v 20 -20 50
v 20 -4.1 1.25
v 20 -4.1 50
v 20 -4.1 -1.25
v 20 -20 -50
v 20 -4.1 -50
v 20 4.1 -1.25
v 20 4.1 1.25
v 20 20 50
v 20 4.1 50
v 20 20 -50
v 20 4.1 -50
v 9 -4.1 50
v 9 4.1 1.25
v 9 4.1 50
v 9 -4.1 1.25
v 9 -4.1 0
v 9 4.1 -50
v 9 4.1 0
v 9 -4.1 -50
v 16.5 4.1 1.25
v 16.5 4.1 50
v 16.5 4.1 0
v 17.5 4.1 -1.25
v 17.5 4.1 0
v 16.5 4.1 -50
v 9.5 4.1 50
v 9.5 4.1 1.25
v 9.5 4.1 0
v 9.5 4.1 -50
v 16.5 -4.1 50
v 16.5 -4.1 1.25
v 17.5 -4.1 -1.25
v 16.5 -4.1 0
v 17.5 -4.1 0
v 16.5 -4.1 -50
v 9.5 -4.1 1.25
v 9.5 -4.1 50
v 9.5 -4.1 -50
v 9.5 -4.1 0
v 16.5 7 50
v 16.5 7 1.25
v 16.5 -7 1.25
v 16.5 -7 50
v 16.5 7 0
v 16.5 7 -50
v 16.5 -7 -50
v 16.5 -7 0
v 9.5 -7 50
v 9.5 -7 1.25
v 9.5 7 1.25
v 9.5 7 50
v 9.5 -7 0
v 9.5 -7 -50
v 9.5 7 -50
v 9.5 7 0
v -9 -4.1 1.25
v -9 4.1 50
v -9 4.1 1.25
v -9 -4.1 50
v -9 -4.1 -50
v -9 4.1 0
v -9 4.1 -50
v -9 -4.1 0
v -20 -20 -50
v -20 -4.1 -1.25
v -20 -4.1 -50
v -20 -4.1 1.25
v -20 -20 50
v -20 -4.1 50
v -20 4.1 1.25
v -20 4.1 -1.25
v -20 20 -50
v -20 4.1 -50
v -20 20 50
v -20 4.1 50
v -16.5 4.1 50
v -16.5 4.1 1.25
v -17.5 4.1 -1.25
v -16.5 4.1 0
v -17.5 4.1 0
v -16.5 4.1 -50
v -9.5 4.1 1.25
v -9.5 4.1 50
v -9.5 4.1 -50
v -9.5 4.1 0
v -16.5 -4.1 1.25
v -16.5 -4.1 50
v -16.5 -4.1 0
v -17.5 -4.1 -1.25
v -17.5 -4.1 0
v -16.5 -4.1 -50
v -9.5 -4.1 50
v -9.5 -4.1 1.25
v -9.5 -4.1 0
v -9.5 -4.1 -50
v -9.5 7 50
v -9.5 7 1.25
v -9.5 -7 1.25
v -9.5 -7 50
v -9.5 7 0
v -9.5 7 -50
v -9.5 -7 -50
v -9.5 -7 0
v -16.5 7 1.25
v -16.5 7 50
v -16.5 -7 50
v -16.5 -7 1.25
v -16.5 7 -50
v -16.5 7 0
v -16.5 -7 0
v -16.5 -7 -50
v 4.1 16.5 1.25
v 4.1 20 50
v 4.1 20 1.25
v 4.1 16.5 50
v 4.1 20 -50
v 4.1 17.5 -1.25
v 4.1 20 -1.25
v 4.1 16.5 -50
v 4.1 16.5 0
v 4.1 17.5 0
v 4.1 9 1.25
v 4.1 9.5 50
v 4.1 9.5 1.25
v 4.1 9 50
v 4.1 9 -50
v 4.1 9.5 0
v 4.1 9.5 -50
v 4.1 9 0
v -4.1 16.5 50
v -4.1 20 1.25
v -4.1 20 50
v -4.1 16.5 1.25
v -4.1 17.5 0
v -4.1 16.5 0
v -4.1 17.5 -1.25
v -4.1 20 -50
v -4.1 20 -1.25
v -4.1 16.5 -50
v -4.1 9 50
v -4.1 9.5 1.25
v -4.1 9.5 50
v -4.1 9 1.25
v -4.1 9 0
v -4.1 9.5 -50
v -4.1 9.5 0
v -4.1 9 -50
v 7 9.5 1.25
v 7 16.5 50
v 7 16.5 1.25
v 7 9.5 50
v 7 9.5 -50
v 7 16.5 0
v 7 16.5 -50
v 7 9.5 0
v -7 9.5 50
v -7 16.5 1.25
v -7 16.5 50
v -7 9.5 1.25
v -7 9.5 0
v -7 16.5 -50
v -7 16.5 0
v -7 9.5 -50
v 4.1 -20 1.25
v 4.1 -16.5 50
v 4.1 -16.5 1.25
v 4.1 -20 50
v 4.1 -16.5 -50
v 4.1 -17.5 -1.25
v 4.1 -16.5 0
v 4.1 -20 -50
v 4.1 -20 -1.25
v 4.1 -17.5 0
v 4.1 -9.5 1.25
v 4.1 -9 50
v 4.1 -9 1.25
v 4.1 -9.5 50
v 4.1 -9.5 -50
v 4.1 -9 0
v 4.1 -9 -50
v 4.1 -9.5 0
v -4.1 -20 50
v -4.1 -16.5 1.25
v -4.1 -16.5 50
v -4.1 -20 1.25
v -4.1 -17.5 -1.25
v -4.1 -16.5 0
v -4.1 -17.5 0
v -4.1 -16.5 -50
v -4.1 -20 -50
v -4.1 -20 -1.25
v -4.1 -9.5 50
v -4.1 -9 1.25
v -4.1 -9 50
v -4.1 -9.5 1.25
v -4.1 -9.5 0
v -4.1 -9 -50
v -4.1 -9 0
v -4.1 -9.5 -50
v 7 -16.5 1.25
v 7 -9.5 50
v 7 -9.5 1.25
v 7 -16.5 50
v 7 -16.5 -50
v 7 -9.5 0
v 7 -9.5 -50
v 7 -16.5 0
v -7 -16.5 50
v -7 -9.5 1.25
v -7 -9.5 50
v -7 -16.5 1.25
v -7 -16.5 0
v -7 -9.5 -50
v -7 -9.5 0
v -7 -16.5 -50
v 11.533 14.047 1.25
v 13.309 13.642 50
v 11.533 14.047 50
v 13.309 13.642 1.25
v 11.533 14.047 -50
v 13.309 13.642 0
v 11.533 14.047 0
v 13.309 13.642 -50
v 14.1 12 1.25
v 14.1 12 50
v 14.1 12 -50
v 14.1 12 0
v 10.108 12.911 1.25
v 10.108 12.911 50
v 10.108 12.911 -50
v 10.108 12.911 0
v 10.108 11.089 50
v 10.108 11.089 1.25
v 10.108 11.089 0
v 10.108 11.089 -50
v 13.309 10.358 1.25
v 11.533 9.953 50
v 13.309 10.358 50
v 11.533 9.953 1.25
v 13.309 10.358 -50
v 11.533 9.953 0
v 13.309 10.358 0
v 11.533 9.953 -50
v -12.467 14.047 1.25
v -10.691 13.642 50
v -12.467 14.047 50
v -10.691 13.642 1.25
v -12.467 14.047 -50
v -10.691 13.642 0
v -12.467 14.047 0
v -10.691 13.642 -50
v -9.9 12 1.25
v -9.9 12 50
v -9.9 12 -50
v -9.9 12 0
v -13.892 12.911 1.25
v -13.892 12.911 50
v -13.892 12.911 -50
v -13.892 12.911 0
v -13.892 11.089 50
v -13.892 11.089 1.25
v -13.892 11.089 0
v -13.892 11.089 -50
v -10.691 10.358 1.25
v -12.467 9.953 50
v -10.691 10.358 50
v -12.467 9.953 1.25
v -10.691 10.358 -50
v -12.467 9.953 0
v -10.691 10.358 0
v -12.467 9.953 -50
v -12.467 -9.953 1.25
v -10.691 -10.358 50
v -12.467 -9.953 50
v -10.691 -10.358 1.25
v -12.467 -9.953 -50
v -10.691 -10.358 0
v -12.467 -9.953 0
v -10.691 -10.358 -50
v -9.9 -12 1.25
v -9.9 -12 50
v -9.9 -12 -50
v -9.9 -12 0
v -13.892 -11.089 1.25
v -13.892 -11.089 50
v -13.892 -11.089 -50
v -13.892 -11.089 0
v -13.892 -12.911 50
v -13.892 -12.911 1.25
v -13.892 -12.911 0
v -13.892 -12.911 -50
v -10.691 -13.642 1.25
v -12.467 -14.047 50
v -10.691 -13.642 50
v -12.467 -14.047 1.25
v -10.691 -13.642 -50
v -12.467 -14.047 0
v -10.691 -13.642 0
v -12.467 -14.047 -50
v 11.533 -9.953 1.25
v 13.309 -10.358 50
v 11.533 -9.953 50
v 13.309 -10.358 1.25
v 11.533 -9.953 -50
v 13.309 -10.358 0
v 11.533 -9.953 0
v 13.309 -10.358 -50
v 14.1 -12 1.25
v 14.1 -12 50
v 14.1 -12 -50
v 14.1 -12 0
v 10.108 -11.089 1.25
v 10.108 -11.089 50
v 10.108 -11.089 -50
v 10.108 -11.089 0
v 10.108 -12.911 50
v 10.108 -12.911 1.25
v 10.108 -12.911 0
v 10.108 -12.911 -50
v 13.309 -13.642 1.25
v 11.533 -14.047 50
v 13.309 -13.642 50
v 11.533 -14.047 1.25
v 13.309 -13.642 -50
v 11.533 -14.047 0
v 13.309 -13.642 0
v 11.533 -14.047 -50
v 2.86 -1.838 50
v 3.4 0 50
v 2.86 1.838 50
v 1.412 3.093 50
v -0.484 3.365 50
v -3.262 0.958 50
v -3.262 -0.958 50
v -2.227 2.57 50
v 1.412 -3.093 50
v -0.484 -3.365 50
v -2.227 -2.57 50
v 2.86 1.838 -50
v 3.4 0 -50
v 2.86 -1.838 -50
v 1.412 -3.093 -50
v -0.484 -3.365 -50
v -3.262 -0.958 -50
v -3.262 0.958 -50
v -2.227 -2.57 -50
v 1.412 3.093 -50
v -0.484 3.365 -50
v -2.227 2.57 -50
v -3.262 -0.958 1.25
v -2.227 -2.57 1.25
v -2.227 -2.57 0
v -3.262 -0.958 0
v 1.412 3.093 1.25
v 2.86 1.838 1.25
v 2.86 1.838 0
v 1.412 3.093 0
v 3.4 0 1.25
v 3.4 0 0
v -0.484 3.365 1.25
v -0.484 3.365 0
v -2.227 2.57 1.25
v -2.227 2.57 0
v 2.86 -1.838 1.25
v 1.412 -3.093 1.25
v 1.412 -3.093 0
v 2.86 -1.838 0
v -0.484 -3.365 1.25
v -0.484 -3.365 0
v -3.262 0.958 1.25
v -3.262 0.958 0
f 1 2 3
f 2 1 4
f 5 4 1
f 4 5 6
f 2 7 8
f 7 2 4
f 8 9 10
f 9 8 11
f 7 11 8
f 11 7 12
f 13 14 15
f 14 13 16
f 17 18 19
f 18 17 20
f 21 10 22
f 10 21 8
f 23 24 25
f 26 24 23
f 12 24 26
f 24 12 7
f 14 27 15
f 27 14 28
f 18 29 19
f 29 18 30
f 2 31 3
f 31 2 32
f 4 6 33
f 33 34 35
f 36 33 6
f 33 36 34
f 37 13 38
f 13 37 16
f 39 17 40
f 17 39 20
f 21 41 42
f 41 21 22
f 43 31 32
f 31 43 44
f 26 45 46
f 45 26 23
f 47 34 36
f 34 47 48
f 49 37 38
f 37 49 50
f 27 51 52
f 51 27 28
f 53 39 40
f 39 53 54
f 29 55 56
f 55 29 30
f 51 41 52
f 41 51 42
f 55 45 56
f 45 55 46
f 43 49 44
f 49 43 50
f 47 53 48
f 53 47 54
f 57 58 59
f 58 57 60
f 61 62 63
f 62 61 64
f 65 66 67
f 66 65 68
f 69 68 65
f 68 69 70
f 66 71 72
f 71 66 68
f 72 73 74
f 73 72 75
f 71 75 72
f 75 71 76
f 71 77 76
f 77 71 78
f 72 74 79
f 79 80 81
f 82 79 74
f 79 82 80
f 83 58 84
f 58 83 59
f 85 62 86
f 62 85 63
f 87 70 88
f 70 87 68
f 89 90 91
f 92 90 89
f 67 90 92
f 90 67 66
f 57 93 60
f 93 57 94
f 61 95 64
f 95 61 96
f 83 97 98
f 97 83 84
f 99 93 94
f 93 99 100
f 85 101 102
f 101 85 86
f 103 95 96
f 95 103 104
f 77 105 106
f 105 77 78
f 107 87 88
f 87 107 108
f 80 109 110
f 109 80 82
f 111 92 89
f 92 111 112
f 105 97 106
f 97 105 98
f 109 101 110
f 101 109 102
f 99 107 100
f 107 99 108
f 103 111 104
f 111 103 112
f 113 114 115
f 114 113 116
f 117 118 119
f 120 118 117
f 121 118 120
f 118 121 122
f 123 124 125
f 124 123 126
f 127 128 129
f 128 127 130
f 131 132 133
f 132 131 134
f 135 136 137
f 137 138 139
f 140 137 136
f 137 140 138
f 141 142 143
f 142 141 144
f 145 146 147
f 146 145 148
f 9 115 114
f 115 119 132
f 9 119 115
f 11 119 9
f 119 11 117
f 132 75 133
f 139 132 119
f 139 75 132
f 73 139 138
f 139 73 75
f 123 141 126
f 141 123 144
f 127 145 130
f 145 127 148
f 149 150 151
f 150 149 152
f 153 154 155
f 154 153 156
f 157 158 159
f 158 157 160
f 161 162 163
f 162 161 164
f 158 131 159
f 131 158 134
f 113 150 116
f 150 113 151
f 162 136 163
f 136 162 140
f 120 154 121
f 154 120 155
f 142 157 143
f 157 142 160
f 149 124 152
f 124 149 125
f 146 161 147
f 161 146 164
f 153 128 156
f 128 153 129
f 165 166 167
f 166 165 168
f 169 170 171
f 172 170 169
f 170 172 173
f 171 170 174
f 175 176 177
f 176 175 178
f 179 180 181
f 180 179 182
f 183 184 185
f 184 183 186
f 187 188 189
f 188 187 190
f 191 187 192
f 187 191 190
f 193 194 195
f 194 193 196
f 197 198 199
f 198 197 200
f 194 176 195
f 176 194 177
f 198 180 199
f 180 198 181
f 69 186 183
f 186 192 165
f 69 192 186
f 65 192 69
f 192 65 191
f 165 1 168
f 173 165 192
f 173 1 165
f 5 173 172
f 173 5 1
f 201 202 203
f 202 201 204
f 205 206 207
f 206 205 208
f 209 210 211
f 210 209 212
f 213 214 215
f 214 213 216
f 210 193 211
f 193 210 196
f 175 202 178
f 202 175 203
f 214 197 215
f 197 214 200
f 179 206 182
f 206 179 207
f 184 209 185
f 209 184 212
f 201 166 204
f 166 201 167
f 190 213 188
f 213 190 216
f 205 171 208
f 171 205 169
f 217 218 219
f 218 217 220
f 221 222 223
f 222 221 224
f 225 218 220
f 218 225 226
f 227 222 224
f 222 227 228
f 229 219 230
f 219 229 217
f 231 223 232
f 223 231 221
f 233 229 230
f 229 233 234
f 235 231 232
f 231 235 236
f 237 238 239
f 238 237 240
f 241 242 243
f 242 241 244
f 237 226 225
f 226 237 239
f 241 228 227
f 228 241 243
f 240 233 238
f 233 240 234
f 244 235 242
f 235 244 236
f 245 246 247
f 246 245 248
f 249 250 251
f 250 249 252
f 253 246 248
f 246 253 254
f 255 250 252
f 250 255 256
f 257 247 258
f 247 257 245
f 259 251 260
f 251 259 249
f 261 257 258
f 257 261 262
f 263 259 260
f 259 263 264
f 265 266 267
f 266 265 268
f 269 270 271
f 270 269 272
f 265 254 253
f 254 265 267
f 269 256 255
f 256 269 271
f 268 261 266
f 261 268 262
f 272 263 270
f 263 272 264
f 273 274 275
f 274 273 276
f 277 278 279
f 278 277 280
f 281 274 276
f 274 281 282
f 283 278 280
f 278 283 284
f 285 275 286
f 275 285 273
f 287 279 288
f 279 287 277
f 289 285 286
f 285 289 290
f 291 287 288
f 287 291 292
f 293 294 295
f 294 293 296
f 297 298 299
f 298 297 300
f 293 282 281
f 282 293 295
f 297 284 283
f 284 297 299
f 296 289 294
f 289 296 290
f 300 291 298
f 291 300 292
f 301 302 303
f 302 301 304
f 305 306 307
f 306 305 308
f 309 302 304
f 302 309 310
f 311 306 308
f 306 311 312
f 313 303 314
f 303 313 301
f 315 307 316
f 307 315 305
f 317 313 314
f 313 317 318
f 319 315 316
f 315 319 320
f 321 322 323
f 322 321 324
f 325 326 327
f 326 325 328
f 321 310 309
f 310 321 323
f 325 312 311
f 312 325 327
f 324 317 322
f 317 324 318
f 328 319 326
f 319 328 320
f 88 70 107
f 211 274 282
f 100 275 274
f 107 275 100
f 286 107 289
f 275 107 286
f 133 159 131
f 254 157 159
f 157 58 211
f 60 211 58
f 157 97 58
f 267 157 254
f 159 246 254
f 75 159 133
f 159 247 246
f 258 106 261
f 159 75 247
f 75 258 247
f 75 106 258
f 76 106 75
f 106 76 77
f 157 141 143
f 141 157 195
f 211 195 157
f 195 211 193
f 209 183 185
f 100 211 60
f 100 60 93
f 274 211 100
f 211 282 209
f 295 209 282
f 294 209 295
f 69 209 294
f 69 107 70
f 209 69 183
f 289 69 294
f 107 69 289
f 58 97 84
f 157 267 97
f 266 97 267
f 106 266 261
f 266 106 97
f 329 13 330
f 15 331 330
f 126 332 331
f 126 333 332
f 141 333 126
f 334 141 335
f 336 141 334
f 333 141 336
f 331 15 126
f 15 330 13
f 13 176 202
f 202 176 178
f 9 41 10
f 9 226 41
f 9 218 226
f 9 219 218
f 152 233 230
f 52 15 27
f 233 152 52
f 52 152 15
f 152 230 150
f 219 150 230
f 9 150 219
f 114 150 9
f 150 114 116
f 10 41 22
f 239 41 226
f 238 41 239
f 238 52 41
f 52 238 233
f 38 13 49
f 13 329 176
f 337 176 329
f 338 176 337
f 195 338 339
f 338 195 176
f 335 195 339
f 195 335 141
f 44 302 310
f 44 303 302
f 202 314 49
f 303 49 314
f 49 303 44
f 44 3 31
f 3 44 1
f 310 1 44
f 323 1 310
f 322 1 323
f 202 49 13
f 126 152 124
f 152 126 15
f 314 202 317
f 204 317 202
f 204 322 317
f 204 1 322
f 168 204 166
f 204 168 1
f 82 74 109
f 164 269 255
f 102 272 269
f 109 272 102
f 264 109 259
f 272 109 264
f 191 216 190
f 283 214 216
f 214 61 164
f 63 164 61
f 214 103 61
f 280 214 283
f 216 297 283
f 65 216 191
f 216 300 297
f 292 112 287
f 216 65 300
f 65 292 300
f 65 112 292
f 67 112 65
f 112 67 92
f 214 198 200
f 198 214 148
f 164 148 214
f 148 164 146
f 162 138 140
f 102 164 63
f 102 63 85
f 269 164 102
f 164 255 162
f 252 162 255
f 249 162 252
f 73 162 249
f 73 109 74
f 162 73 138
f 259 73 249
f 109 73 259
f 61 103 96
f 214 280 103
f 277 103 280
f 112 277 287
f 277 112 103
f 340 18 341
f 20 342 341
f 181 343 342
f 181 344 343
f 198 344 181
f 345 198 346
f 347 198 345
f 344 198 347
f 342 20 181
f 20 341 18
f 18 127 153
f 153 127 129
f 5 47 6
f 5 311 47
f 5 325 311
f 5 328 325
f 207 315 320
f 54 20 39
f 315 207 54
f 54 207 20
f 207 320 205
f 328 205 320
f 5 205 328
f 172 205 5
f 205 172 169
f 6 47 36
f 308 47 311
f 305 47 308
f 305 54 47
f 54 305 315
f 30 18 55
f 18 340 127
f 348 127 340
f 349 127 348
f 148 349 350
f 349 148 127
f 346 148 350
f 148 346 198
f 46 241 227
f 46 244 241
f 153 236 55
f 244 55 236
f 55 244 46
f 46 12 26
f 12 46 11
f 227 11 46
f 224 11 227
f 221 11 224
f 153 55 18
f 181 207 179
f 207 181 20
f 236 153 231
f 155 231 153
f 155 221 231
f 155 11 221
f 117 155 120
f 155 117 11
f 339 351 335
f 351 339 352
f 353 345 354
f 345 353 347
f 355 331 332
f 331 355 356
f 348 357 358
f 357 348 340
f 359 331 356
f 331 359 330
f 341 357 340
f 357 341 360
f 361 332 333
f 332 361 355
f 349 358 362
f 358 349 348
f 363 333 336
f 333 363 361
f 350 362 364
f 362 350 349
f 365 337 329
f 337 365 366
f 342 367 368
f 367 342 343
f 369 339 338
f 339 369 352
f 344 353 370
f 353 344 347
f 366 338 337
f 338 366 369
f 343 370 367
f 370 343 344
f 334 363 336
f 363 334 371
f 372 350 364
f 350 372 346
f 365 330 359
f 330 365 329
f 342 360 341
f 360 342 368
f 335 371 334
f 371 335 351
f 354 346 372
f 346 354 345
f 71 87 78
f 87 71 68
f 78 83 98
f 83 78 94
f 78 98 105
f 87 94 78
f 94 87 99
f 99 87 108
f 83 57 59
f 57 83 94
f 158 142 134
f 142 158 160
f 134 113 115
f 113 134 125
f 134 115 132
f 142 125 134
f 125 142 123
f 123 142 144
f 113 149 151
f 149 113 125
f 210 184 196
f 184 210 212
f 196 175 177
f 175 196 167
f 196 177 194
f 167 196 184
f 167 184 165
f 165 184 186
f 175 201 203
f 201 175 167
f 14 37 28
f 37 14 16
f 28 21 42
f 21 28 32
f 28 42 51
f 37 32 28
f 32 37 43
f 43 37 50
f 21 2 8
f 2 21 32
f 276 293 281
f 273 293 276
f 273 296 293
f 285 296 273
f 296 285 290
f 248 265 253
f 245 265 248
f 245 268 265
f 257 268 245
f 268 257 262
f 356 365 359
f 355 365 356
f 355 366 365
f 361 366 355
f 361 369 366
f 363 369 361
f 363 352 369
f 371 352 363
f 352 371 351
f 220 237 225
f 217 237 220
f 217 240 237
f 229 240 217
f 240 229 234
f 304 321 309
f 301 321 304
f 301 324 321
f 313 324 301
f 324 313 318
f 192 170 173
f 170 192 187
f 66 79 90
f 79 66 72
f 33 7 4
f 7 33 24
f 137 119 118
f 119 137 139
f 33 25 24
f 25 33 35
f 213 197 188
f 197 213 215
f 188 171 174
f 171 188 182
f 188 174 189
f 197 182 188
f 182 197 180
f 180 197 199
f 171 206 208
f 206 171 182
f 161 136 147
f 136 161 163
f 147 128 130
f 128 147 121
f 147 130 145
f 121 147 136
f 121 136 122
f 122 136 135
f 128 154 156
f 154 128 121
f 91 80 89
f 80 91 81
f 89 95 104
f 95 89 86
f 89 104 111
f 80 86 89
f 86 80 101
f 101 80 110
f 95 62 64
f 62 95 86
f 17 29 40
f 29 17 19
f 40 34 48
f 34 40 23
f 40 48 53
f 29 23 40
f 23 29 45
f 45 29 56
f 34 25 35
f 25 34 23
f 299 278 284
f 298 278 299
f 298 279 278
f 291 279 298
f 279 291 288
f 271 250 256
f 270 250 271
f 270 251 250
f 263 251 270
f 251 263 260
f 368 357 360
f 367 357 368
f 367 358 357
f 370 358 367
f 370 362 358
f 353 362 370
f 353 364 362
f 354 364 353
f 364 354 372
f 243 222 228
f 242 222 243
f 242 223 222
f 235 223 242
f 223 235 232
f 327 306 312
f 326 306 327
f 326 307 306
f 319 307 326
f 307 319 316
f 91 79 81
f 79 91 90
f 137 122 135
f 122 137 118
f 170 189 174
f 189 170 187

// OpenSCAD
// Parameters
profile_width_mm = 40; //[20:80:1]
profile_height_mm = 40; //[20:80:1]
length_mm = 100; //[50:200:1]
center_length = 1; //[0:1:1]
include_corner_holes = 1; //[0:1:1]
wall_thickness_mm = 2.5; //[1.2:5:0.1]
slot_opening_mm = 8.2; //[5:12:0.1]
slot_depth_mm = 10; //[6:16:0.1]
slot_cavity_width_mm = 14; //[10:20:0.1]
slot_cavity_depth_mm = 6; //[3:10:0.1]
center_bore_diameter_mm = 6.8; //[3:12:0.1]
corner_hole_diameter_mm = 4.2; //[0:8:0.1]
corner_hole_offset_mm = 8; //[5:14:0.1]
overlap_mm = 1; //[0.5:2:0.1]

// E4040 Extrusion - complete geometry
module extrusion() {
  color("Silver") {
    difference() {
      // Main body
      cube([profile_width_mm, profile_height_mm, length_mm], center=true);
      
      // T-slot channels
      union() {
        translate([profile_width_mm/2 - (slot_depth_mm + overlap_mm)/2, 0, 0])
          cube([slot_depth_mm + overlap_mm, slot_opening_mm, length_mm + overlap_mm*2], center=true);
        translate([profile_width_mm/2 - slot_depth_mm + slot_cavity_depth_mm/2, 0, 0])
          cube([slot_cavity_depth_mm + overlap_mm, slot_cavity_width_mm, length_mm + overlap_mm*2], center=true);
        translate([-profile_width_mm/2 + (slot_depth_mm + overlap_mm)/2, 0, 0])
          cube([slot_depth_mm + overlap_mm, slot_opening_mm, length_mm + overlap_mm*2], center=true);
        translate([-profile_width_mm/2 + slot_depth_mm - slot_cavity_depth_mm/2, 0, 0])
          cube([slot_cavity_depth_mm + overlap_mm, slot_cavity_width_mm, length_mm + overlap_mm*2], center=true);
        translate([0, profile_height_mm/2 - (slot_depth_mm + overlap_mm)/2, 0])
          cube([slot_opening_mm, slot_depth_mm + overlap_mm, length_mm + overlap_mm*2], center=true);
        translate([0, profile_height_mm/2 - slot_depth_mm + slot_cavity_depth_mm/2, 0])
          cube([slot_cavity_width_mm, slot_cavity_depth_mm + overlap_mm, length_mm + overlap_mm*2], center=true);
        translate([0, -profile_height_mm/2 + (slot_depth_mm + overlap_mm)/2, 0])
          cube([slot_opening_mm, slot_depth_mm + overlap_mm, length_mm + overlap_mm*2], center=true);
        translate([0, -profile_height_mm/2 + slot_depth_mm - slot_cavity_depth_mm/2, 0])
          cube([slot_cavity_width_mm, slot_cavity_depth_mm + overlap_mm, length_mm + overlap_mm*2], center=true);
      }
      
      // Center bore
      translate([0, 0, 0])
        cylinder(r=center_bore_diameter_mm/2, h=length_mm + overlap_mm*2, center=true);
      
      // Corner holes
      if (include_corner_holes) {
        union() {
          translate([profile_width_mm/2 - corner_hole_offset_mm, profile_height_mm/2 - corner_hole_offset_mm, 0])
            cylinder(r=corner_hole_diameter_mm/2, h=length_mm + overlap_mm*2, center=true);
          translate([-profile_width_mm/2 + corner_hole_offset_mm, profile_height_mm/2 - corner_hole_offset_mm, 0])
            cylinder(r=corner_hole_diameter_mm/2, h=length_mm + overlap_mm*2, center=true);
          translate([-profile_width_mm/2 + corner_hole_offset_mm, -profile_height_mm/2 + corner_hole_offset_mm, 0])
            cylinder(r=corner_hole_diameter_mm/2, h=length_mm + overlap_mm*2, center=true);
          translate([profile_width_mm/2 - corner_hole_offset_mm, -profile_height_mm/2 + corner_hole_offset_mm, 0])
            cylinder(r=corner_hole_diameter_mm/2, h=length_mm + overlap_mm*2, center=true);
        }
      }
    }
  }
}

// Extrusion Cross Section - complete geometry
module extrusion_cross_section() {
  color("DimGray") {
    difference() {
      // Outer profile
      cube([profile_width_mm, profile_height_mm, wall_thickness_mm], center=true);
      
      // Inner cavity
      translate([0, 0, -wall_thickness_mm/2])
        cube([profile_width_mm - 2*wall_thickness_mm, profile_height_mm - 2*wall_thickness_mm, wall_thickness_mm], center=true);
    }
  }
}

// Box Corner Profile Sections - complete geometry
module box_corner_profile_sections() {
  color("Silver") {
    union() {
      // Corner sections
      translate([profile_width_mm/2 - wall_thickness_mm/2, profile_height_mm/2 - wall_thickness_mm/2, 0])
        cube([wall_thickness_mm, wall_thickness_mm, length_mm], center=true);
      translate([-profile_width_mm/2 + wall_thickness_mm/2, profile_height_mm/2 - wall_thickness_mm/2, 0])
        cube([wall_thickness_mm, wall_thickness_mm, length_mm], center=true);
      translate([-profile_width_mm/2 + wall_thickness_mm/2, -profile_height_mm/2 + wall_thickness_mm/2, 0])
        cube([wall_thickness_mm, wall_thickness_mm, length_mm], center=true);
      translate([profile_width_mm/2 - wall_thickness_mm/2, -profile_height_mm/2 + wall_thickness_mm/2, 0])
        cube([wall_thickness_mm, wall_thickness_mm, length_mm], center=true);
    }
  }
}

// Box Corner Profile Section - complete geometry
module box_corner_profile_section() {
  color("Silver") {
    // Single corner section
    translate([profile_width_mm/2 - wall_thickness_mm/2, profile_height_mm/2 - wall_thickness_mm/2, 0])
      cube([wall_thickness_mm, wall_thickness_mm, length_mm], center=true);
  }
}

// Assembly
module assembly() {
  extrusion();
  translate([0, 0, 0]) extrusion_cross_section();
  translate([0, 0, 0]) box_corner_profile_sections();
  translate([0, 0, 0]) box_corner_profile_section();
}

assembly();
